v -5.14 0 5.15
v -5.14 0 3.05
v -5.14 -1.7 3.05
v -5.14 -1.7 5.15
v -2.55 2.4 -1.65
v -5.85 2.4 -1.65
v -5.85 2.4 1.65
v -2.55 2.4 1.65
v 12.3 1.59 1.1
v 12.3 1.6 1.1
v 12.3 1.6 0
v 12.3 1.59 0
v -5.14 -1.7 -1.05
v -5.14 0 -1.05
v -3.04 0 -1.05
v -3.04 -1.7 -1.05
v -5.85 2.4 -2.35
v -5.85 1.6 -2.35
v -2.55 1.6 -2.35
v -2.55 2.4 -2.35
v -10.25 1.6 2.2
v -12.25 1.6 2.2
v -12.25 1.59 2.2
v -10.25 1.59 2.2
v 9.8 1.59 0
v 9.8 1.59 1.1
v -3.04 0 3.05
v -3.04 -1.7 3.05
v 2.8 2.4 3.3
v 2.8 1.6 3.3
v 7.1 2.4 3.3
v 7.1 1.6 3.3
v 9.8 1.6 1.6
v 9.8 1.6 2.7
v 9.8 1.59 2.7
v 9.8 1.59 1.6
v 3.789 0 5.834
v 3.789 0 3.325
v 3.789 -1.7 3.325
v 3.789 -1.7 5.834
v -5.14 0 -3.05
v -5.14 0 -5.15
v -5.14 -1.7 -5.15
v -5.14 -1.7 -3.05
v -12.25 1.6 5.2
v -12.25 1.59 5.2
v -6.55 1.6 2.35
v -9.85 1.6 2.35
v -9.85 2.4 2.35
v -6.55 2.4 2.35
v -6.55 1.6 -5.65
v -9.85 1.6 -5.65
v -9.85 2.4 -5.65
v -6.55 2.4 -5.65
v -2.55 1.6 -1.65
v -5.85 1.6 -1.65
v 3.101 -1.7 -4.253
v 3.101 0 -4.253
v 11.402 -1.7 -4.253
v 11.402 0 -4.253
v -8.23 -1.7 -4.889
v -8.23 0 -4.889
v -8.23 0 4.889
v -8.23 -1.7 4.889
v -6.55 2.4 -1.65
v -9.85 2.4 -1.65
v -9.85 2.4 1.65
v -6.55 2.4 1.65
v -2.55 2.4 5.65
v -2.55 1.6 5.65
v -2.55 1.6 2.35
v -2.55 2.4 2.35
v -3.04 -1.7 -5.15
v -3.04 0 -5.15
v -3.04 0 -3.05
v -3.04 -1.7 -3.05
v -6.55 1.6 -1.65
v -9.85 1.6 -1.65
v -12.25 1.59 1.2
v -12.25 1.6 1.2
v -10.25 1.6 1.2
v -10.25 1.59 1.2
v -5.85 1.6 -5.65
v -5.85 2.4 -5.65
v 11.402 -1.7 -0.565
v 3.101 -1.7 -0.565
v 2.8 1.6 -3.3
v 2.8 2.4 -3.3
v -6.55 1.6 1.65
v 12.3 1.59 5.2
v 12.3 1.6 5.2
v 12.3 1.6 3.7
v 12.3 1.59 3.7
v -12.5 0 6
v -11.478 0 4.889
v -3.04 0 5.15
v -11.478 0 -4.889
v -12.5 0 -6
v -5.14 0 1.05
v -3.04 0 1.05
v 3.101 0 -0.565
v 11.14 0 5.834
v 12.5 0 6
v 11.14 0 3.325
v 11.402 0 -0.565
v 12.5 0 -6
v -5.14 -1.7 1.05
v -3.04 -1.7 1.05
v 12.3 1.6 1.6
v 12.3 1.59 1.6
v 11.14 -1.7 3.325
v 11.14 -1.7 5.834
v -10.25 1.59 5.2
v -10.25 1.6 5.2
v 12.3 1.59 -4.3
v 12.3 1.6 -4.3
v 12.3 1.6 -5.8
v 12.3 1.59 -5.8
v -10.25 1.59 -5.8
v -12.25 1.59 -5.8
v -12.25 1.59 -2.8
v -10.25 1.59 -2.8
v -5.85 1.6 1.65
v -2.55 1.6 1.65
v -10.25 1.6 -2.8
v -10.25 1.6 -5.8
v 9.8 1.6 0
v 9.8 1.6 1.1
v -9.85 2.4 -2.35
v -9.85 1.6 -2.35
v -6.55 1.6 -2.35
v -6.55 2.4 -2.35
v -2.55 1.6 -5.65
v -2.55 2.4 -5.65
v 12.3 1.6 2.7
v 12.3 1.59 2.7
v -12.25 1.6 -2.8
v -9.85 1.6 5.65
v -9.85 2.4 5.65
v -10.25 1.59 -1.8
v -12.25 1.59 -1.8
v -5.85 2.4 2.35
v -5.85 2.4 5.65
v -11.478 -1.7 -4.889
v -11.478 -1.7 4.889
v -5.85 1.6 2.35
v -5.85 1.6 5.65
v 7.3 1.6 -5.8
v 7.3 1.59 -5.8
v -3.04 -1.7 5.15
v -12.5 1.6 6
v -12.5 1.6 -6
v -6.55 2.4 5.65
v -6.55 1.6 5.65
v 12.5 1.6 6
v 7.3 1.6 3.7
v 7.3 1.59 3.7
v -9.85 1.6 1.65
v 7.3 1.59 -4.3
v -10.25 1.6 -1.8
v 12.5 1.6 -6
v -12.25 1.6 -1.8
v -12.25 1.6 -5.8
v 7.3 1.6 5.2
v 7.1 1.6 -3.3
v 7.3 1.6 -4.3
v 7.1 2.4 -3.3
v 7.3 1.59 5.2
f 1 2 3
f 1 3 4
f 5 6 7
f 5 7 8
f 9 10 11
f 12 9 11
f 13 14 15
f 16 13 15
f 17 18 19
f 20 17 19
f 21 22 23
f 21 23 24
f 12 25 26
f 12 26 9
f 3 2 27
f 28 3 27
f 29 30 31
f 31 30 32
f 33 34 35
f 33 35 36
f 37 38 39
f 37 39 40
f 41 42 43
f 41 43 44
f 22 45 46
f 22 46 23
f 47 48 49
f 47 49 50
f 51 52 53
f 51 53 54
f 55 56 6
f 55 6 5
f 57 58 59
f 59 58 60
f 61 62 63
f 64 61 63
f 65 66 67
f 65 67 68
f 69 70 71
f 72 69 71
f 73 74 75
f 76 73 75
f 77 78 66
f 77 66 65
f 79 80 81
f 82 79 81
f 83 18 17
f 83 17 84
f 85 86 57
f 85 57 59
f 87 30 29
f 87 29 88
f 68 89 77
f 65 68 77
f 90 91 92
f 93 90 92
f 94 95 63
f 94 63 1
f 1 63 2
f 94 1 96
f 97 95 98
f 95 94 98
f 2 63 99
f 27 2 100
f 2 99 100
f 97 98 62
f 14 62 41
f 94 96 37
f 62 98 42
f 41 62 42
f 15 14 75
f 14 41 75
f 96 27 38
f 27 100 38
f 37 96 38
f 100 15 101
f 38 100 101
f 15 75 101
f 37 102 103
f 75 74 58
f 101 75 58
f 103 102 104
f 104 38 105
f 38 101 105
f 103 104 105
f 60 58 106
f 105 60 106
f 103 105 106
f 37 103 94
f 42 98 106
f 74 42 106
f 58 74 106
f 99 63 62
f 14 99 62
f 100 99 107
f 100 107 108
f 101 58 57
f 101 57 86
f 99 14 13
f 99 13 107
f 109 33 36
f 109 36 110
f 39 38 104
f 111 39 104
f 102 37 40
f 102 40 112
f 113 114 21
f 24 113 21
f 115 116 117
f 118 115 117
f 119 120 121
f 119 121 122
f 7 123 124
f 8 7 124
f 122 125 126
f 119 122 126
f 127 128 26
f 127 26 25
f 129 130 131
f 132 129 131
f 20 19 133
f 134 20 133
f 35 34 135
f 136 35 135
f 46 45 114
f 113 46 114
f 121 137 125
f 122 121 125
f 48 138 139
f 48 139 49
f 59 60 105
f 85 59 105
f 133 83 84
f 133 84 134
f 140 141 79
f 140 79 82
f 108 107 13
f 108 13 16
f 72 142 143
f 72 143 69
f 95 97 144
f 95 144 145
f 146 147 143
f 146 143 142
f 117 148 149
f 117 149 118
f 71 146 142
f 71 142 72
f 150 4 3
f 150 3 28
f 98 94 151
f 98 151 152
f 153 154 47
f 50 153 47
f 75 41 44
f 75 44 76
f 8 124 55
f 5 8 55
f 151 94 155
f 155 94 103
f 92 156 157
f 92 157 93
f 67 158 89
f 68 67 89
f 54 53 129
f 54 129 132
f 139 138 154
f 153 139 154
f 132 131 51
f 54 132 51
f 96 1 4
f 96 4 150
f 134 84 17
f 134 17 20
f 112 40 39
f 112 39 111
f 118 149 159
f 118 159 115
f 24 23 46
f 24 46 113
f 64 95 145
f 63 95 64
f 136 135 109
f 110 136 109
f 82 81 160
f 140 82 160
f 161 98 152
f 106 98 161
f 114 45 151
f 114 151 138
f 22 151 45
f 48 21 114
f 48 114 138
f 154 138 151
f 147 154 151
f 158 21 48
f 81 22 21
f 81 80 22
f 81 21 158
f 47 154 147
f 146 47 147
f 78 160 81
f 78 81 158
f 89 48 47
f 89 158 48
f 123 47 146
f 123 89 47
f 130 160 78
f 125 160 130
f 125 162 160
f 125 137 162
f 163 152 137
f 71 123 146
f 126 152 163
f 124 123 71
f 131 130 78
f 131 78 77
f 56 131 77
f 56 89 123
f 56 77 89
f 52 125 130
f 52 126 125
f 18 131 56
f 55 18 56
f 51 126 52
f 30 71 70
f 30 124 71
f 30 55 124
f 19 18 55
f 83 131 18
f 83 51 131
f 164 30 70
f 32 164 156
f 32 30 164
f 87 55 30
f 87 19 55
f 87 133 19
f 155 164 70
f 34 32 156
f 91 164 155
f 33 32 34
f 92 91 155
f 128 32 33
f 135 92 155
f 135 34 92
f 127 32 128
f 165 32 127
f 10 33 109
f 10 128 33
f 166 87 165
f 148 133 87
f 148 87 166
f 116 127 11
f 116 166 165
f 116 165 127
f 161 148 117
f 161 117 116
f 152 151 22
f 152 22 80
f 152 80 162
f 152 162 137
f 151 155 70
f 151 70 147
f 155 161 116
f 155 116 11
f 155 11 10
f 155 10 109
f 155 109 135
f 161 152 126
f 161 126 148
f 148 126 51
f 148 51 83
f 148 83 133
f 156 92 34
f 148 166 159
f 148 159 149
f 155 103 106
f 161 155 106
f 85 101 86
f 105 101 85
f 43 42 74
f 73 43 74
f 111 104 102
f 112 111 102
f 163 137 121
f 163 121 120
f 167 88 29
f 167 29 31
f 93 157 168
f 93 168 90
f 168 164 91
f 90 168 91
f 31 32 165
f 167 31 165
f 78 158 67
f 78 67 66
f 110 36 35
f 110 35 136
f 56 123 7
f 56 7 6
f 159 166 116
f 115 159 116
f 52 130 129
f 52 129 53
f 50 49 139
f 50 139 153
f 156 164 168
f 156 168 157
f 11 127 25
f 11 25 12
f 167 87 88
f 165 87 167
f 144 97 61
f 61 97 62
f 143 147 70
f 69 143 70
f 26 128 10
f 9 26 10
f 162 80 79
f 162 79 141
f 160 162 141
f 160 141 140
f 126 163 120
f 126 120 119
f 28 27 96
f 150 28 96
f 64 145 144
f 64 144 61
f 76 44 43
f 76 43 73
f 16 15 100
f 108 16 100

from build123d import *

# Parameters (mm, degrees)
SKETCH1_W           = 25
SKETCH1_H           = 12
BOSS_EXTRUDE1_DEPTH = 1.6
SKETCH2_W           = 3.3
SKETCH2_H           = 3.3
SKETCH2_W_2         = 4.3
SKETCH2_H_2         = 6.6
BOSS_EXTRUDE2_DEPTH = 0.8
SKETCH3_W           = 2
SKETCH3_H           = 3
SKETCH3_W_2         = 5
SKETCH3_H_2         = 1.5
SKETCH3_W_3         = 2.5
SKETCH3_H_3         = 1.1
CUT_EXTRUDE1_DEPTH  = 0.01
SKETCH4_W           = 8.300946921
SKETCH4_H           = 3.688339109
SKETCH4_W_2         = 3.248116331
SKETCH4_H_2         = 9.777349986
SKETCH4_W_3         = 2.1
SKETCH4_H_3         = 2.1
SKETCH4_W_4         = 7.351587475
SKETCH4_H_4         = 2.509074224
BOSS_EXTRUDE3_DEPTH = 1.7


with BuildPart() as part:
    # Sketch1 → Boss-Extrude1 (new body)
    with BuildSketch(Plane(origin=(0, 0, 0), x_dir=(1, 0, 0), z_dir=(0, 1, 0))):
        Rectangle(SKETCH1_W, SKETCH1_H)
    extrude(amount=BOSS_EXTRUDE1_DEPTH)

    # Sketch2 → Boss-Extrude2 (add)
    with BuildSketch(Plane(origin=(0, 1.6, 0), x_dir=(1, 0, 0), z_dir=(0, 1, 0))):
        with Locations((-4.2, 4)):
            Rectangle(SKETCH2_W, SKETCH2_H)
        with Locations((-8.2, -4)):
            Rectangle(SKETCH2_W, SKETCH2_H)
        with Locations((-8.2, 4)):
            Rectangle(SKETCH2_W, SKETCH2_H)
        with Locations((-8.2, 0)):
            Rectangle(SKETCH2_W, SKETCH2_H)
        with Locations((-4.2, 0)):
            Rectangle(SKETCH2_W, SKETCH2_H)
        with Locations((-4.2, -4)):
            Rectangle(SKETCH2_W, SKETCH2_H)
        with Locations((4.95, 0)):
            Rectangle(SKETCH2_W_2, SKETCH2_H_2)
    extrude(amount=BOSS_EXTRUDE2_DEPTH)

    # Sketch3 → Cut-Extrude1 (cut)
    with BuildSketch(Plane(origin=(0, 1.6, 0), x_dir=(1, 0, 0), z_dir=(0, 1, 0))):
        with Locations((-11.25, 4.3)):
            Rectangle(SKETCH3_W, SKETCH3_H)
        with Locations((9.8, -4.45)):
            Rectangle(SKETCH3_W_2, SKETCH3_H_2)
        with Locations((-11.25, 0.3)):
            Rectangle(SKETCH3_W, SKETCH3_H)
        with Locations((-11.25, -3.7)):
            Rectangle(SKETCH3_W, SKETCH3_H)
        with Locations((9.8, 5.05)):
            Rectangle(SKETCH3_W_2, SKETCH3_H_2)
        with Locations((11.05, -2.15)):
            Rectangle(SKETCH3_W_3, SKETCH3_H_3)
        with Locations((11.05, -0.55)):
            Rectangle(SKETCH3_W_3, SKETCH3_H_3)
    extrude(amount=-CUT_EXTRUDE1_DEPTH, mode=Mode.SUBTRACT)

    # Sketch4 → Boss-Extrude3 (add)
    with BuildSketch(Plane.XZ):
        with Locations((7.251224506, -2.408711255)):
            Rectangle(SKETCH4_W, SKETCH4_H)
        with Locations((-9.853821619, 0)):
            Rectangle(SKETCH4_W_2, SKETCH4_H_2)
        with Locations((-4.089790985, 4.1)):
            Rectangle(SKETCH4_W_3, SKETCH4_H_3)
        with Locations((-4.089790985, 0)):
            Rectangle(SKETCH4_W_3, SKETCH4_H_3)
        with Locations((-4.089790985, -4.1)):
            Rectangle(SKETCH4_W_3, SKETCH4_H_3)
        with Locations((7.464495816, 4.579060458)):
            Rectangle(SKETCH4_W_4, SKETCH4_H_4)
    extrude(amount=BOSS_EXTRUDE3_DEPTH)


solid = part.part
